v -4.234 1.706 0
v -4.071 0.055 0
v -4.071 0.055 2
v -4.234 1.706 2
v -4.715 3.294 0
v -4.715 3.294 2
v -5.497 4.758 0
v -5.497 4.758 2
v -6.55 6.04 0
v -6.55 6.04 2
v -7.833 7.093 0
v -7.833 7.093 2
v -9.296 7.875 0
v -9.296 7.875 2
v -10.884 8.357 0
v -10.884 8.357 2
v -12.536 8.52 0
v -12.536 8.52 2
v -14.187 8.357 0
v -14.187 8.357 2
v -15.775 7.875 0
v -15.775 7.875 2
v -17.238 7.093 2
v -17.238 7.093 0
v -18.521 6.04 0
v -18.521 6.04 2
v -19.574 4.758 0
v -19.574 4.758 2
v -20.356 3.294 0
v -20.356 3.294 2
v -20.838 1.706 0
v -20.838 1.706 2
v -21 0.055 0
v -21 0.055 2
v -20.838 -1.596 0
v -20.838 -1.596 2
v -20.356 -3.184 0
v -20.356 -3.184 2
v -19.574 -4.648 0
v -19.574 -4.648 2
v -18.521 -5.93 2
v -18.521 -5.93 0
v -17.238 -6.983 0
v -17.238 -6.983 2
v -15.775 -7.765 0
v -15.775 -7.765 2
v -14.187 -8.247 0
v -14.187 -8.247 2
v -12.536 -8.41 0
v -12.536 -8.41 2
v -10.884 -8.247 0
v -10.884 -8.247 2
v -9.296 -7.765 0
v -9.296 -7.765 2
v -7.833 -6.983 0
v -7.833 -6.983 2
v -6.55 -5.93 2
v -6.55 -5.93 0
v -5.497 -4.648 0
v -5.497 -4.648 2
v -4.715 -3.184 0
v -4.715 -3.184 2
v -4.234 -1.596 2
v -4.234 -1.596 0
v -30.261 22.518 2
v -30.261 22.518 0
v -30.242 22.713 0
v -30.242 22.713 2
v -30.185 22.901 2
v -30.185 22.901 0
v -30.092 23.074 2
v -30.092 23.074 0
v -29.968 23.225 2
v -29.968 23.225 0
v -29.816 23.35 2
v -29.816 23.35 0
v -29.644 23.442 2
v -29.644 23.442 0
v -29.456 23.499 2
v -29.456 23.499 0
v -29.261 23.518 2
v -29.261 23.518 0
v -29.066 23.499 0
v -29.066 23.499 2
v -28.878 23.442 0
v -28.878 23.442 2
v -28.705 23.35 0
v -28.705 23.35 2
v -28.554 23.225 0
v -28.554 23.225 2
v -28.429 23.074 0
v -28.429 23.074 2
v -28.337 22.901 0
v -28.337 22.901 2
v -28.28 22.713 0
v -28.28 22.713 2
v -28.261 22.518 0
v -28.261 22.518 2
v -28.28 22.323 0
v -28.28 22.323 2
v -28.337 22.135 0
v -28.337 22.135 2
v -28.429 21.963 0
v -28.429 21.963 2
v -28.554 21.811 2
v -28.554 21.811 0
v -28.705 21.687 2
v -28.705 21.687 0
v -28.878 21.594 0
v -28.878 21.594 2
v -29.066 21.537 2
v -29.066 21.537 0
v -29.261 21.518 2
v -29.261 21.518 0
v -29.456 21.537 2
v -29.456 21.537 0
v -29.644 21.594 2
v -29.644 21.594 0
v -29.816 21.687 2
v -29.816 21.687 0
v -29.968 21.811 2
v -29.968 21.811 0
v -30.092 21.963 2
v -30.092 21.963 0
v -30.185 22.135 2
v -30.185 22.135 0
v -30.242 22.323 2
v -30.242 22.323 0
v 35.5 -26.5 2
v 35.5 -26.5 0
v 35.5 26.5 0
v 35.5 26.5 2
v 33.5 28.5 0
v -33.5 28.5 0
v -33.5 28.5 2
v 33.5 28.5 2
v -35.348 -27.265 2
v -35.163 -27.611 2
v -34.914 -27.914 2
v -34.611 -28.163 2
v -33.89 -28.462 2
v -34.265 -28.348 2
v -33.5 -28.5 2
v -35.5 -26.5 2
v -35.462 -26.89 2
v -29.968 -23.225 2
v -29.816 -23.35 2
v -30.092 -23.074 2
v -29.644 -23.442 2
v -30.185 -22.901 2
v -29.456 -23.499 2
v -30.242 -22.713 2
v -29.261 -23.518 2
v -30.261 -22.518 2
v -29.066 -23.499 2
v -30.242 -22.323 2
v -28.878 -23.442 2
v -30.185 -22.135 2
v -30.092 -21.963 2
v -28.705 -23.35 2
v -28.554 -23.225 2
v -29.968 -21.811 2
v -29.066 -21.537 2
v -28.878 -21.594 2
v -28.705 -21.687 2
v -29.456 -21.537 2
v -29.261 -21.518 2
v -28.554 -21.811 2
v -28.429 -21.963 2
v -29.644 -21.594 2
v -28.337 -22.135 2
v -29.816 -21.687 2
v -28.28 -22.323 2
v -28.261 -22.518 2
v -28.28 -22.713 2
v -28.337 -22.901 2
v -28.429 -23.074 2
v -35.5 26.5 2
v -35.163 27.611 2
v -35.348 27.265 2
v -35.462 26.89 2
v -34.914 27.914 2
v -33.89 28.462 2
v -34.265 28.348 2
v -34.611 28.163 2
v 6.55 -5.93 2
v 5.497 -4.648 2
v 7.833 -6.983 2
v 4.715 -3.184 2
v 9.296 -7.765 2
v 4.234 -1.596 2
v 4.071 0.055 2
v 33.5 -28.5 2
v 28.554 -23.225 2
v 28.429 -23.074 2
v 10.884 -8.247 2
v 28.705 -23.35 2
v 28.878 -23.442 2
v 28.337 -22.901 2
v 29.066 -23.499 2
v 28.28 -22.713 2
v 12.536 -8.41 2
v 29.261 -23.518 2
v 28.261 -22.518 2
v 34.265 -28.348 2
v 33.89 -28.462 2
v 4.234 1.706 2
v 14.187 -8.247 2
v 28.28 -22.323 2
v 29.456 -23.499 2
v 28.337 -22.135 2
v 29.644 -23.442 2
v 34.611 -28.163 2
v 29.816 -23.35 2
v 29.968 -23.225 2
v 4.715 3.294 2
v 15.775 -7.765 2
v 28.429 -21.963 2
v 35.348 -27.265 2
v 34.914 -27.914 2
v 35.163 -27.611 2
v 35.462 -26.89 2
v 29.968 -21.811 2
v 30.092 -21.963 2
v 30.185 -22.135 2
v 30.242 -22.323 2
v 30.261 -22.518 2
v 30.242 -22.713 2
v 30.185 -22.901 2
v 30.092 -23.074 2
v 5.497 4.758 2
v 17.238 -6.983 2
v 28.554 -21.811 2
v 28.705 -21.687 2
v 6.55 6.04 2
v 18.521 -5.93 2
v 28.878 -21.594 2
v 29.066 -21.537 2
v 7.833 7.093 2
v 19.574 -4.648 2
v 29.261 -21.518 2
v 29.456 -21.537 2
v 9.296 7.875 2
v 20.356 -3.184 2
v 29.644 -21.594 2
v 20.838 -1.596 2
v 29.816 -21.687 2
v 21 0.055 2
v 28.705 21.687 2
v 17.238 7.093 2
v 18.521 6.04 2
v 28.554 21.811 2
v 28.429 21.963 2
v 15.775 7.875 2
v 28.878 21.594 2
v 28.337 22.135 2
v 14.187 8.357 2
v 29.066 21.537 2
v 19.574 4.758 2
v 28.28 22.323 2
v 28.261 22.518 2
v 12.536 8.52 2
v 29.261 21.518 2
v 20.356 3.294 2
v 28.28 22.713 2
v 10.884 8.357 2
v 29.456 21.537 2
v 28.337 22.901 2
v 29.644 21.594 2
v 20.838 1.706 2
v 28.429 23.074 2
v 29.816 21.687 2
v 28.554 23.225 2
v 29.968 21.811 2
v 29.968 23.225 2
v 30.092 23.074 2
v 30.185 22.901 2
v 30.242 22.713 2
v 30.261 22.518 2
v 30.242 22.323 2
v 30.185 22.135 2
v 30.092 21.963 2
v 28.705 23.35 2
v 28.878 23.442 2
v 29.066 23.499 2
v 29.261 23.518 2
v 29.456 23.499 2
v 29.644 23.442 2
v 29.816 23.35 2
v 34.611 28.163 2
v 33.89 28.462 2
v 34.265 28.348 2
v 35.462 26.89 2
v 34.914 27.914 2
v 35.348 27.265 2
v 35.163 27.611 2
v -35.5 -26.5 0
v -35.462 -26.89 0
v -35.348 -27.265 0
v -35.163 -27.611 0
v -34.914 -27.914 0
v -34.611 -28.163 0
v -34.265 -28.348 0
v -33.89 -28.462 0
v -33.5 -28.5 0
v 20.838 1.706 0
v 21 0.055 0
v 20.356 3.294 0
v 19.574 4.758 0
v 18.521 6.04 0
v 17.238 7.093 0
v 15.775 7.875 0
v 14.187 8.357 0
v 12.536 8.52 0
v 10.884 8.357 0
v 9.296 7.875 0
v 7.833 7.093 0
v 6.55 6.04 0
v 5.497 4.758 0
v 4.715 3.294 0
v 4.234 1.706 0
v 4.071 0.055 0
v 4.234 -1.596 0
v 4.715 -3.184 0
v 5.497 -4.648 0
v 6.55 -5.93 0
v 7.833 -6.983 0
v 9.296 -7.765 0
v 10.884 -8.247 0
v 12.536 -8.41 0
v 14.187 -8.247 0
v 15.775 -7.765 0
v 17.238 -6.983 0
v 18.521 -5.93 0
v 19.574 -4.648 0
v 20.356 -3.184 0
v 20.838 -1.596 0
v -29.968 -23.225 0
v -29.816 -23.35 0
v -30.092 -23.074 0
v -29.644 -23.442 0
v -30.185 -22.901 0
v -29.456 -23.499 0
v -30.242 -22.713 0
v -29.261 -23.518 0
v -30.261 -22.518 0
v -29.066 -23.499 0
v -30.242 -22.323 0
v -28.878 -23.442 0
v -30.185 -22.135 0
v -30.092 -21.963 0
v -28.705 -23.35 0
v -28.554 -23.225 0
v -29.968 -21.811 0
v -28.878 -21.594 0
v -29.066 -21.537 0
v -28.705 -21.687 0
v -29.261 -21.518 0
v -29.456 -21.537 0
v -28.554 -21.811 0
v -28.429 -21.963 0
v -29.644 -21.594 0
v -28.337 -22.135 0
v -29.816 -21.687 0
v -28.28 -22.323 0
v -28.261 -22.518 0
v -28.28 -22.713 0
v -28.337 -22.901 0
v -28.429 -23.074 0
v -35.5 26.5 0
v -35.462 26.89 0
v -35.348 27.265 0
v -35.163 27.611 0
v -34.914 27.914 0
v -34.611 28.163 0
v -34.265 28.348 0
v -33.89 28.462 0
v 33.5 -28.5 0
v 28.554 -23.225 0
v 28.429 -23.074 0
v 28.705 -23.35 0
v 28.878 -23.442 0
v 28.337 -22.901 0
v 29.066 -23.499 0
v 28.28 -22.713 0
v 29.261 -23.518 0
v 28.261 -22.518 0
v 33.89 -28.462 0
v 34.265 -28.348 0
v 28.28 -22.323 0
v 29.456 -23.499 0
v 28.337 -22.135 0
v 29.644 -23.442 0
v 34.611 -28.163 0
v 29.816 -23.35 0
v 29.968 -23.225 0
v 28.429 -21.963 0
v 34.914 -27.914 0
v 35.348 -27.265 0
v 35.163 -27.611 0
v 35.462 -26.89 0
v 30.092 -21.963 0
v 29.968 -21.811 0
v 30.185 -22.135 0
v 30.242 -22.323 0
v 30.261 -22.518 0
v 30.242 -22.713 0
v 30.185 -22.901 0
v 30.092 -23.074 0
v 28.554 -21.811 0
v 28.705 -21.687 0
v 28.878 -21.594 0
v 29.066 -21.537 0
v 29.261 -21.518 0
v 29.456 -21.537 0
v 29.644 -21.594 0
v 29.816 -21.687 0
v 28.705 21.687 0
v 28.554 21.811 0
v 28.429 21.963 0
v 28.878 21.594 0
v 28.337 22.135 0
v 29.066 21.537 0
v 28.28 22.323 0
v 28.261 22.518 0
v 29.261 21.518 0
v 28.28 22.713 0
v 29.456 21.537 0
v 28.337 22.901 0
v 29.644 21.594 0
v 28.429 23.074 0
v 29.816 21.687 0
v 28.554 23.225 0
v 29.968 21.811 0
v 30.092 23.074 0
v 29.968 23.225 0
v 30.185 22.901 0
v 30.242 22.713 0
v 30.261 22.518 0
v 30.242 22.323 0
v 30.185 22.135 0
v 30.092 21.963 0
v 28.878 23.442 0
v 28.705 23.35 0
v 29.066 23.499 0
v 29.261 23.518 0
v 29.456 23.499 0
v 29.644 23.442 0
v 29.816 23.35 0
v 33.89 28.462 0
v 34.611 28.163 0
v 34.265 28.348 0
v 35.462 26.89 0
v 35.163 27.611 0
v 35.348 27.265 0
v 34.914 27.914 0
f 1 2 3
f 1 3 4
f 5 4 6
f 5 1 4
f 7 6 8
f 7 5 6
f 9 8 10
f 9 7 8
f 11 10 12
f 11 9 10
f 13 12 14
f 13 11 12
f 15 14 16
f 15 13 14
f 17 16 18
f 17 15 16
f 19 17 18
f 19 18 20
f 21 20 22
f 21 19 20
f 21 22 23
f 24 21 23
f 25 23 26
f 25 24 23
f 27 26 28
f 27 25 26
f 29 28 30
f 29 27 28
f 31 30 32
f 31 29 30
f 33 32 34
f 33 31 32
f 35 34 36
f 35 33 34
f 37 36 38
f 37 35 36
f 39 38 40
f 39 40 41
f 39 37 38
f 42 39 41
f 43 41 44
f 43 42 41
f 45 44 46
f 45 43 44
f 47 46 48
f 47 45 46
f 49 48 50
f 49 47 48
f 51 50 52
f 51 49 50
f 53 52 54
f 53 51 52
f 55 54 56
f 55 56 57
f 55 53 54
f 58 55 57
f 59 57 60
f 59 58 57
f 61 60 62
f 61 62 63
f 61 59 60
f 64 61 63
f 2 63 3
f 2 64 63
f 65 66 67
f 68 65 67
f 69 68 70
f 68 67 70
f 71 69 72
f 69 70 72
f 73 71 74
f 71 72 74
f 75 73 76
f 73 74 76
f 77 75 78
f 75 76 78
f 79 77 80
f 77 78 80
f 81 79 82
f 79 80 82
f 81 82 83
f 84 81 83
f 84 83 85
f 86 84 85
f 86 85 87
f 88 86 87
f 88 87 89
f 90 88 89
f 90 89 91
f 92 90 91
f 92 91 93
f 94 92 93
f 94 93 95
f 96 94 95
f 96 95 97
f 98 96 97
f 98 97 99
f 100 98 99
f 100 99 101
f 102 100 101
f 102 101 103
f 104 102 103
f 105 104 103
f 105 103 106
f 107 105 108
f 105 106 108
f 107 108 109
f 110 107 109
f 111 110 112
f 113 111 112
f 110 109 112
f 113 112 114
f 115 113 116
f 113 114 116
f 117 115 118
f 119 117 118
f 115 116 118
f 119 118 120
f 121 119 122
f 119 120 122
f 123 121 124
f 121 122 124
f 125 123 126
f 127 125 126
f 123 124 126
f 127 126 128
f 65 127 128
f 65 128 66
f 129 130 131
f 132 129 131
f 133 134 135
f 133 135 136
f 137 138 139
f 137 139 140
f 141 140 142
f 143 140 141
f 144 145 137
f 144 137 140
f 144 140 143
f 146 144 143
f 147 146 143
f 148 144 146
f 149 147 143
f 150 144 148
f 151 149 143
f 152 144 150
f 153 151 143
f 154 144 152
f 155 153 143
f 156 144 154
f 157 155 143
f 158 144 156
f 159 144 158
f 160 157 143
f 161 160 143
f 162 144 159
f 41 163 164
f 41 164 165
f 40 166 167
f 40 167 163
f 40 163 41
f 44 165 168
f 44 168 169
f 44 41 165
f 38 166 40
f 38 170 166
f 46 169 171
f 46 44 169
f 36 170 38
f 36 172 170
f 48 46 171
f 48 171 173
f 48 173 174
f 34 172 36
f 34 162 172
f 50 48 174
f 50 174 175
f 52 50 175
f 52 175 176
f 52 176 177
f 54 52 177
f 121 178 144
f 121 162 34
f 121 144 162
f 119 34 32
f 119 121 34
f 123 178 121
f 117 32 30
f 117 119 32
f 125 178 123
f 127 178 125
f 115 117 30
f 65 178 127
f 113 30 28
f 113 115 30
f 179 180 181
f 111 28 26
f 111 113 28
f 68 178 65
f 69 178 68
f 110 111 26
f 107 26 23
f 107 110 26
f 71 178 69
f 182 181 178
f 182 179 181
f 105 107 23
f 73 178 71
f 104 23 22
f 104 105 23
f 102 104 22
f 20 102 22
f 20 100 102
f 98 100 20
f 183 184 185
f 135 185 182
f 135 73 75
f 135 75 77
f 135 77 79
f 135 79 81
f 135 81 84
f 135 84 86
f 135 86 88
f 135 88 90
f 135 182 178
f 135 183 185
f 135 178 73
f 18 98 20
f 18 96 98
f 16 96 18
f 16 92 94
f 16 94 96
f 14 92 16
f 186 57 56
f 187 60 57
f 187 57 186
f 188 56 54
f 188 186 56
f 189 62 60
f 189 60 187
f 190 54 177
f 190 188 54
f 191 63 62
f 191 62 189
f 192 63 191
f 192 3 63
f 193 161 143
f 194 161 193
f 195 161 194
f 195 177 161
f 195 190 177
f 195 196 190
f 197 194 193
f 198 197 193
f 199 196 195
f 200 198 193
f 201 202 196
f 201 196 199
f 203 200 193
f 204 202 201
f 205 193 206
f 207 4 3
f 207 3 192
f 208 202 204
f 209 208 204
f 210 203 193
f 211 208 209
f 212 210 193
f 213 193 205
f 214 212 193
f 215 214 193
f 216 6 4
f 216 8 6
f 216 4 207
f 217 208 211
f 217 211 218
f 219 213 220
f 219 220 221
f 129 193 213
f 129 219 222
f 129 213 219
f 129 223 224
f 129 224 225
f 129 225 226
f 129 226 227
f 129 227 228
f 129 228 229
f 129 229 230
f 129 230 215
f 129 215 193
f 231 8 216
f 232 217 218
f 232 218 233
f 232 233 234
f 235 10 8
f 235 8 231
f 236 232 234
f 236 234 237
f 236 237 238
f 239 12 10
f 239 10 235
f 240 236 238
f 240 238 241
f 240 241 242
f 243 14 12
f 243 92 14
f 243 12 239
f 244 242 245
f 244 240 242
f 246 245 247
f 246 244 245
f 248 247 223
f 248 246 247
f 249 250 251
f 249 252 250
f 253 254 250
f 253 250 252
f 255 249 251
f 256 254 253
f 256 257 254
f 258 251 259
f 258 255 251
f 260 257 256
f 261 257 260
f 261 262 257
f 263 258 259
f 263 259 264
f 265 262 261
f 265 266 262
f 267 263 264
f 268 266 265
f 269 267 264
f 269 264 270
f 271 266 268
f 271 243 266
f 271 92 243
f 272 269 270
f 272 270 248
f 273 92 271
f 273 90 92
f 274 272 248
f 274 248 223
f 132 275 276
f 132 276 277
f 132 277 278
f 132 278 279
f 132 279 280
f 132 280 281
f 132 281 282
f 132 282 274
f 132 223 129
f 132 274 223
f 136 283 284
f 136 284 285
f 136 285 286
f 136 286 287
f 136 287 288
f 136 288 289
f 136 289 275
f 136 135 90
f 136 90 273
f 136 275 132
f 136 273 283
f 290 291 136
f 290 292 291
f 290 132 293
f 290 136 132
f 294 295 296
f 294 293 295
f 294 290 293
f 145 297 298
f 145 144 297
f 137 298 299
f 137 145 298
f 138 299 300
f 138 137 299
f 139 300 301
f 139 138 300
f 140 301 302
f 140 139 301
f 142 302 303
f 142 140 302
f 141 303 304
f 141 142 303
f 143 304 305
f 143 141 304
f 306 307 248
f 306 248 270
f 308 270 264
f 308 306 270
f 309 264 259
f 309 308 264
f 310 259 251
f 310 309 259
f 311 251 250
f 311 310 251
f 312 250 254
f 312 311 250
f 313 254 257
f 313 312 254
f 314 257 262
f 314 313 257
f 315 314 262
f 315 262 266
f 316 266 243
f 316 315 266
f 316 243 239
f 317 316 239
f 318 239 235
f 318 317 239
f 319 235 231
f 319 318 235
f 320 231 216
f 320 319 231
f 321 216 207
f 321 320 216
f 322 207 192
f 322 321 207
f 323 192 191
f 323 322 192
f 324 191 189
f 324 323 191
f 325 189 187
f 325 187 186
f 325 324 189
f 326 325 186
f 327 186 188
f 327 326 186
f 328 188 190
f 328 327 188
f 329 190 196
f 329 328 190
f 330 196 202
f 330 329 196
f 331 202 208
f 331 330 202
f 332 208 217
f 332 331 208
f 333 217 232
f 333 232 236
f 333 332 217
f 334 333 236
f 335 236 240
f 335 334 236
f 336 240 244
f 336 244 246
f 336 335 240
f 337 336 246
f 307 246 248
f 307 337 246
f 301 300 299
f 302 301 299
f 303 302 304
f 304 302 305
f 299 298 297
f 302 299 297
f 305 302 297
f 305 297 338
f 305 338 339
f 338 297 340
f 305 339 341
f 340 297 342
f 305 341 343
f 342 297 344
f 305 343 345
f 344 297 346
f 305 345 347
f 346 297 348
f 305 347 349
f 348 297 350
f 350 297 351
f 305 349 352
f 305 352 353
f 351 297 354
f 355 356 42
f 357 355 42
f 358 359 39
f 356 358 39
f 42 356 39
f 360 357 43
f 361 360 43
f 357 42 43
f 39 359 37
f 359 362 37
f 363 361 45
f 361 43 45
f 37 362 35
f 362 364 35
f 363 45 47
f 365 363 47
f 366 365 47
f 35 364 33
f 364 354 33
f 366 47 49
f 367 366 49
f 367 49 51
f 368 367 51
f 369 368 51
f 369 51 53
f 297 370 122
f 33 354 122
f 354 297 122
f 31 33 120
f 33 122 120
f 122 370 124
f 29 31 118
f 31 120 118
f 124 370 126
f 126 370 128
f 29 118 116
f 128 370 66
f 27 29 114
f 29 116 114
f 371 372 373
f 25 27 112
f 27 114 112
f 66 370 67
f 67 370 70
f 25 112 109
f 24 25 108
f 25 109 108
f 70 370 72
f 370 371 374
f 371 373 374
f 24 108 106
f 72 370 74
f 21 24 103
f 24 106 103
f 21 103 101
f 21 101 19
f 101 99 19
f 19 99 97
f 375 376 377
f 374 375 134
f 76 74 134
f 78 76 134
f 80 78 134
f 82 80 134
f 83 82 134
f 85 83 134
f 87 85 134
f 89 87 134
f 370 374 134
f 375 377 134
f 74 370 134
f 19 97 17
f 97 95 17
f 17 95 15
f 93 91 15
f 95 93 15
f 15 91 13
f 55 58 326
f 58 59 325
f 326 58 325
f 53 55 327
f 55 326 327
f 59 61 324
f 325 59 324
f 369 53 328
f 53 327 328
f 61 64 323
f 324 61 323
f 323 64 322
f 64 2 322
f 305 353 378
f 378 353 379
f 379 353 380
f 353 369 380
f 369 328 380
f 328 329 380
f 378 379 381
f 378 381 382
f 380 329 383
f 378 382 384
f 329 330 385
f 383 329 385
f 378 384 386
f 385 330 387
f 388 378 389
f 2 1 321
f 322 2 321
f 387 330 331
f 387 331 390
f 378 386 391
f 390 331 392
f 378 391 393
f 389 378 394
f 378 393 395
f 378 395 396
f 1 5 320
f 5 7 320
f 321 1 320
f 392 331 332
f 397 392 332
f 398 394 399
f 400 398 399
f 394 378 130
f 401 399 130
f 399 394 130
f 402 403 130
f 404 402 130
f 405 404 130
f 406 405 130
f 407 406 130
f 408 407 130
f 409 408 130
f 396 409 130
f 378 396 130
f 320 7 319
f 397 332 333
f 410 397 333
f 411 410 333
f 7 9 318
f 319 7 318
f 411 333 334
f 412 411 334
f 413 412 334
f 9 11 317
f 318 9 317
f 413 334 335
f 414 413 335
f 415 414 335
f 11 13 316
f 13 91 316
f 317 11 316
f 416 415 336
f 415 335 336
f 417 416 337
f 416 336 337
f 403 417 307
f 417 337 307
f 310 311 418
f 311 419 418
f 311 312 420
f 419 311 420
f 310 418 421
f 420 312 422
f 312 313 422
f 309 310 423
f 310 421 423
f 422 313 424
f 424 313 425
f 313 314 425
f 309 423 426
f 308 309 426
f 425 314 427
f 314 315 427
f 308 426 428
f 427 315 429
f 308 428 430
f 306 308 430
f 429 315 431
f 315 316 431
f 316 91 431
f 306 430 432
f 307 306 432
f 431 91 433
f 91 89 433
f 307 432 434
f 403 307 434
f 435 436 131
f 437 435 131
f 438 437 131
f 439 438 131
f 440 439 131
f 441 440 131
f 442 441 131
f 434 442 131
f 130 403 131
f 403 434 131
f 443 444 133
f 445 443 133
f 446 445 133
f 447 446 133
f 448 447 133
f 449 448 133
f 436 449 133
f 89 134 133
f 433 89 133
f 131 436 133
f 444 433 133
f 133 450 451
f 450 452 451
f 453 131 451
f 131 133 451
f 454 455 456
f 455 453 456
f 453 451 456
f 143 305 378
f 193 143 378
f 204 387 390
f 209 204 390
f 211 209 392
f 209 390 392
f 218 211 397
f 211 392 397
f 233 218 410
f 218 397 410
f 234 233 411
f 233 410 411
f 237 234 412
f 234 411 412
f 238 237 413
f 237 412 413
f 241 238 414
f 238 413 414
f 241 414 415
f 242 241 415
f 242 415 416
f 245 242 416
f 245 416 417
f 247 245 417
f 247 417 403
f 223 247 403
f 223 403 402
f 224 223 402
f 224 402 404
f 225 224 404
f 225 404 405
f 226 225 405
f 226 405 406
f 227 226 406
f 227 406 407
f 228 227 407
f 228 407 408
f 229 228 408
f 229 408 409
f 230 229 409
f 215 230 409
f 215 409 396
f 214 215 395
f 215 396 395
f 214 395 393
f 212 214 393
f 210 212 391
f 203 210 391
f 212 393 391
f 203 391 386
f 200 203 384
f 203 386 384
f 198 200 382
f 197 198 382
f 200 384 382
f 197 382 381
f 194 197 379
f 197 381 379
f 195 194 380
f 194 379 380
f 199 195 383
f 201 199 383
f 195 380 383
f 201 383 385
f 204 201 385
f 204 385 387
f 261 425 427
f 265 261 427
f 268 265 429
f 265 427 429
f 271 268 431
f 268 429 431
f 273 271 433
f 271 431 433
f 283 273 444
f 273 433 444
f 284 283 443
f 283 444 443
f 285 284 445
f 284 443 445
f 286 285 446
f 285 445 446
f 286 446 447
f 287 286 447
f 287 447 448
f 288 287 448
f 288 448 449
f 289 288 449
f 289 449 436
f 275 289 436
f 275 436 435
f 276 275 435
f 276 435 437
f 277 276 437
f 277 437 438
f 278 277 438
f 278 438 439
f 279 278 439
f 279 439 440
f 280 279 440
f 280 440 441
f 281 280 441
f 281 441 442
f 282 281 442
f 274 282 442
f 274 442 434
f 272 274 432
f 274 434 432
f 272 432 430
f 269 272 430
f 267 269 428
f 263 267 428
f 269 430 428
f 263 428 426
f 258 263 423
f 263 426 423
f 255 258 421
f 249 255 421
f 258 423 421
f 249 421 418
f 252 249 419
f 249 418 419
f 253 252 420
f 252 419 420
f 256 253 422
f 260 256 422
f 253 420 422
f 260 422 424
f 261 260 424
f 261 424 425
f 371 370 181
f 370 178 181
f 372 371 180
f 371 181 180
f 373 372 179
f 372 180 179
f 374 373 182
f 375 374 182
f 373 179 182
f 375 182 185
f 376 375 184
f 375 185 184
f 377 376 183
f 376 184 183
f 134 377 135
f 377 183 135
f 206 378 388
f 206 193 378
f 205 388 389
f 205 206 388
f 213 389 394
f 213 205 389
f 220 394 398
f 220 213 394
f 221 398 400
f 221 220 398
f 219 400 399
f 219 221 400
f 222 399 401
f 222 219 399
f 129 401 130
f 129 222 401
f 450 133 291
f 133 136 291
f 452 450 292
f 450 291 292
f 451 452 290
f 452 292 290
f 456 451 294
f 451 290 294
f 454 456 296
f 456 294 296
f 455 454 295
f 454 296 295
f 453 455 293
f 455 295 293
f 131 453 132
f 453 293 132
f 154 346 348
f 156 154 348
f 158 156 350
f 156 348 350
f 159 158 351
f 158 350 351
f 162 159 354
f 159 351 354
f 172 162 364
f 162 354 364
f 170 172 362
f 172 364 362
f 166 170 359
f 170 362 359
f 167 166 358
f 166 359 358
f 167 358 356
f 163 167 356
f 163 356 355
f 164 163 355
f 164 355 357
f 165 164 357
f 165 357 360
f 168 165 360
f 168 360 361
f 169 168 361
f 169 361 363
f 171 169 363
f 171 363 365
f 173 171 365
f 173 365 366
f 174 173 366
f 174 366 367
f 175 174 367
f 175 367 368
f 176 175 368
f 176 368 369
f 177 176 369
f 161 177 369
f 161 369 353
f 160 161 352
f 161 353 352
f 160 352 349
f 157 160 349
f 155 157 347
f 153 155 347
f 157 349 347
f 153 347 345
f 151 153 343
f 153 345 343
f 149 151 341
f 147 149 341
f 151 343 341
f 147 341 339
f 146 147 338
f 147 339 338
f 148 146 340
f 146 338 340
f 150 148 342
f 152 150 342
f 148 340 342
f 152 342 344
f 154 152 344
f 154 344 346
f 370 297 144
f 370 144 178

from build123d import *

# Parameters (mm, degrees)
F0_W     = 71
F0_H     = 57
F0_R     = 8.464637
F1_DEPTH = 2
F2_R     = 2
F4_D     = 2


with BuildPart() as f1:
    # F0 (on Top) → F1 (new body)
    with BuildSketch(Plane.XY):
        Rectangle(F0_W, F0_H)
        with Locations((-12.535542, 0.055034)):
            Circle(F0_R, mode=Mode.SUBTRACT)
        with Locations((12.535542, 0.055034)):
            Circle(F0_R, mode=Mode.SUBTRACT)
    extrude(amount=F1_DEPTH)

    # F2
    f2_edges = [f1.edges().sort_by_distance(p)[0] for p in [
        (-35.5, 28.5, 1),
        (35.5, 28.5, 1),
        (35.5, -28.5, 1),
        (-35.5, -28.5, 1),
    ]]
    fillet(f2_edges, radius=F2_R)

    # F4 (through all)
    with Locations(Plane.XY.offset(2)):
        with Locations((-29.260905, 22.518175), (29.260905, 22.518175), (-29.260905, -22.518175), (29.260905, -22.518175)):
            Hole(F4_D / 2)


solid = f1.part
